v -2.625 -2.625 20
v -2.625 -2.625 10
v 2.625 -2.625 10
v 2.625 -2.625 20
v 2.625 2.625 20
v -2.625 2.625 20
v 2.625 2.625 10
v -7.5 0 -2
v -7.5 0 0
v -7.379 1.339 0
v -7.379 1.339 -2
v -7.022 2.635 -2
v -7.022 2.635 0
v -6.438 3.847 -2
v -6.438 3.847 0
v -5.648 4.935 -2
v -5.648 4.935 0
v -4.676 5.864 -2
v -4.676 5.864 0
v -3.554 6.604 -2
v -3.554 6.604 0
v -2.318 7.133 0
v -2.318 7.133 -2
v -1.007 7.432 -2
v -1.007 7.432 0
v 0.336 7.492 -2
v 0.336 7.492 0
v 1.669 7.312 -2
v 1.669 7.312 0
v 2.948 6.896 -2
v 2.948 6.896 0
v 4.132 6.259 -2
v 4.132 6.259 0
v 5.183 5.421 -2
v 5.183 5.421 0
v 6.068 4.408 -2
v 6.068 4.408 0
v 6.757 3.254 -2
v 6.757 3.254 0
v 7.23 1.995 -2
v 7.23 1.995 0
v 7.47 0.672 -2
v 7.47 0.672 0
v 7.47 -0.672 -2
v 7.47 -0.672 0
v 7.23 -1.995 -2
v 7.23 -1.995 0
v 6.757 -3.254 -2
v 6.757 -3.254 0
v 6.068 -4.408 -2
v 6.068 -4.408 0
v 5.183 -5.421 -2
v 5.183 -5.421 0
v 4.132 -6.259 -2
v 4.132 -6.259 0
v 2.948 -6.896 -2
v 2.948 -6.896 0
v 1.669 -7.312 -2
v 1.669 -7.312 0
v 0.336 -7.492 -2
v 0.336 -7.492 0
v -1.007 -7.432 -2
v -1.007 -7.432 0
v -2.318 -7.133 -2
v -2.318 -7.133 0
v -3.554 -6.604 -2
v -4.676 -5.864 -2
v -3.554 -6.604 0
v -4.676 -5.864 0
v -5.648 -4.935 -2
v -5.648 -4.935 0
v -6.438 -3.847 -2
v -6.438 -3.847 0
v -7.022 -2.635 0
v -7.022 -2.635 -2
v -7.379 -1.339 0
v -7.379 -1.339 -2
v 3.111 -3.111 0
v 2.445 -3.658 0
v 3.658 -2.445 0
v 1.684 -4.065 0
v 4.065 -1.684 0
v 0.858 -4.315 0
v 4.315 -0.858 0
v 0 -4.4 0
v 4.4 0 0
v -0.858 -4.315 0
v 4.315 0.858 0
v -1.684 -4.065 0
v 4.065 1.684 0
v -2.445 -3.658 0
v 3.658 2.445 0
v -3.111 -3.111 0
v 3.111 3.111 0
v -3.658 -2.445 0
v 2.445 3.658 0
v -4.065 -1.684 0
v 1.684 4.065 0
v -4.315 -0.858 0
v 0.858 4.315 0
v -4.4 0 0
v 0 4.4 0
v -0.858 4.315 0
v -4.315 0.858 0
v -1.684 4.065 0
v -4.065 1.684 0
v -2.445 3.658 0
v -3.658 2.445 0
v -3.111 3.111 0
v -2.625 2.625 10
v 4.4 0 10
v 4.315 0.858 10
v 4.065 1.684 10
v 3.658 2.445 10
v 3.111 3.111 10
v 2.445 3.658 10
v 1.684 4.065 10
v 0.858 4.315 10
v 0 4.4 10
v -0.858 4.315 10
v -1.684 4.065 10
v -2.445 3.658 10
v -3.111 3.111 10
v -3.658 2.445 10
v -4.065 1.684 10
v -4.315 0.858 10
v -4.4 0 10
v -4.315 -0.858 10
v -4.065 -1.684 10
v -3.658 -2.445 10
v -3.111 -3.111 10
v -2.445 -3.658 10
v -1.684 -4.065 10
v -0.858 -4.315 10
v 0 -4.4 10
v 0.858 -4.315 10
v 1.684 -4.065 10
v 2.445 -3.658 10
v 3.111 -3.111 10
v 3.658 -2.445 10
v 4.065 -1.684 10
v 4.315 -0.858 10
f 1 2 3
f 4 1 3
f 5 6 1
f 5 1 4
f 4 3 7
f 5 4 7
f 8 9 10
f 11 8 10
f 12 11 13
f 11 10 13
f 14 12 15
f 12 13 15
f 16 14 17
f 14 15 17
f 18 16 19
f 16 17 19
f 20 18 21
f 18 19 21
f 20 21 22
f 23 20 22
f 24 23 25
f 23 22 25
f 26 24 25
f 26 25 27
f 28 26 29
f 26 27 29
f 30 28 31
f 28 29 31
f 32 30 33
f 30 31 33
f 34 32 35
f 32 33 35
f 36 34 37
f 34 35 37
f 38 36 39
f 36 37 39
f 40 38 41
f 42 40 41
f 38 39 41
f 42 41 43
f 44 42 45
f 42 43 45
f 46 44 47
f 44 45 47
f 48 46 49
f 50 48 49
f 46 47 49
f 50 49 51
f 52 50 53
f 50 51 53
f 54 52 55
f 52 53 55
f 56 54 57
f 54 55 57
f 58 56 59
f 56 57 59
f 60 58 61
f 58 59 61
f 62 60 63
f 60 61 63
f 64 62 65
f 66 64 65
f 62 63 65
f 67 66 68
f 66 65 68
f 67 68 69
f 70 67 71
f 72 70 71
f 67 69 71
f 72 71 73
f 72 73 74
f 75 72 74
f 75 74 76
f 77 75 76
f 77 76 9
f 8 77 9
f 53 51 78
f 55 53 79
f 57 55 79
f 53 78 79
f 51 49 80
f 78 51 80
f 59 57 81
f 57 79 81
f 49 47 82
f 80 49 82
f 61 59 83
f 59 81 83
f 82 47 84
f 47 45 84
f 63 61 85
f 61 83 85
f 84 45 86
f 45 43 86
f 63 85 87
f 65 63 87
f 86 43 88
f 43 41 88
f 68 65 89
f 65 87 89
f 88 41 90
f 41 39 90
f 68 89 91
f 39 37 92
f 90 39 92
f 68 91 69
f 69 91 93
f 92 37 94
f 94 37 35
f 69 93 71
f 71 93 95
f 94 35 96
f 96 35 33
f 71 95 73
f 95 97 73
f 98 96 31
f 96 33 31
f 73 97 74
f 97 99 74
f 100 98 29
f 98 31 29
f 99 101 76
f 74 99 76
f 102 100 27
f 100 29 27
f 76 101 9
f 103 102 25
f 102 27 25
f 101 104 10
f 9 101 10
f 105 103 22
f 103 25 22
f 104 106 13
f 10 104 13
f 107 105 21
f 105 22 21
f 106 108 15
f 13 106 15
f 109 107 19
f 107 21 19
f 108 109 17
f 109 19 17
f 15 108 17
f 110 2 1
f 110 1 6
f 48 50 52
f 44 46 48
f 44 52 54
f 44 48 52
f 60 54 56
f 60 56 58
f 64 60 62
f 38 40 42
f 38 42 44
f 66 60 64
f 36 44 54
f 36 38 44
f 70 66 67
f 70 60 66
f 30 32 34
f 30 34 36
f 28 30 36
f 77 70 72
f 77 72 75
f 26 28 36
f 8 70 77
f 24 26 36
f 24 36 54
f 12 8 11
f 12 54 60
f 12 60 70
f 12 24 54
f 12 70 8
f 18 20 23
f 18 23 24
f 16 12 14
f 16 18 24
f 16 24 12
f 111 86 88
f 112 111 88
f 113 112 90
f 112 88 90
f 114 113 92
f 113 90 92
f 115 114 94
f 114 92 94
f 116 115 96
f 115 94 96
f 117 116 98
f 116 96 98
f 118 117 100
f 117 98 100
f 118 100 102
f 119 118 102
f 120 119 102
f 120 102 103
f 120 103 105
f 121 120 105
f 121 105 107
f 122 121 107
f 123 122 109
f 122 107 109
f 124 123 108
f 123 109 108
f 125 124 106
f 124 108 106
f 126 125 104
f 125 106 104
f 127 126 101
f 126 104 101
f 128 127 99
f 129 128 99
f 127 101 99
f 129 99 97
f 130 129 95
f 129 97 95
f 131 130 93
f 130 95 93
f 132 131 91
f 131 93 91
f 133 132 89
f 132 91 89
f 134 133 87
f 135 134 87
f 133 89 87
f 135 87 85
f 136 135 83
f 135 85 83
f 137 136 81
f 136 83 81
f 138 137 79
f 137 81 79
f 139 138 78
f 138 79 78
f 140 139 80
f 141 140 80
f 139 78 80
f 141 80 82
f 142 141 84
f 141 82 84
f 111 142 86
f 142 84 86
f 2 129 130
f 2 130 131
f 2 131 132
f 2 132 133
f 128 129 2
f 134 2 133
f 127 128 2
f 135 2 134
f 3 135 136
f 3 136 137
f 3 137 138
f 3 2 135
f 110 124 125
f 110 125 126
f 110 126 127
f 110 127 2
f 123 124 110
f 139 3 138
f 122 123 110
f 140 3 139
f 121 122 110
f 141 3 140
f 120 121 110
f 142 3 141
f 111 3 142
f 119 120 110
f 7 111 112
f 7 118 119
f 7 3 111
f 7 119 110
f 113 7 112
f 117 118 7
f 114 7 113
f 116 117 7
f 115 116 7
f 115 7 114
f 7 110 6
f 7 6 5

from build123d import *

# Parameters (mm, degrees)
SKETCH1_R           = 4.4
BOSS_EXTRUDE1_DEPTH = 10
SKETCH2_W           = 5.25
SKETCH2_H           = 5.25
BOSS_EXTRUDE2_DEPTH = 10
SKETCH3_R           = 7.5
BOSS_EXTRUDE3_DEPTH = 2


with BuildPart() as part:
    # Sketch1 → Boss-Extrude1 (new body)
    with BuildSketch(Plane.XY):
        Circle(SKETCH1_R)
    extrude(amount=BOSS_EXTRUDE1_DEPTH)

    # Sketch2 → Boss-Extrude2 (add)
    with BuildSketch(Plane.XY.offset(10)):
        Rectangle(SKETCH2_W, SKETCH2_H)
    extrude(amount=BOSS_EXTRUDE2_DEPTH)

    # Sketch3 → Boss-Extrude3 (add)
    with BuildSketch(Plane(origin=(0, 0, 0), x_dir=(-1, 0, 0), z_dir=(0, 0, -1))):
        Circle(SKETCH3_R)
    extrude(amount=BOSS_EXTRUDE3_DEPTH)


solid = part.part
